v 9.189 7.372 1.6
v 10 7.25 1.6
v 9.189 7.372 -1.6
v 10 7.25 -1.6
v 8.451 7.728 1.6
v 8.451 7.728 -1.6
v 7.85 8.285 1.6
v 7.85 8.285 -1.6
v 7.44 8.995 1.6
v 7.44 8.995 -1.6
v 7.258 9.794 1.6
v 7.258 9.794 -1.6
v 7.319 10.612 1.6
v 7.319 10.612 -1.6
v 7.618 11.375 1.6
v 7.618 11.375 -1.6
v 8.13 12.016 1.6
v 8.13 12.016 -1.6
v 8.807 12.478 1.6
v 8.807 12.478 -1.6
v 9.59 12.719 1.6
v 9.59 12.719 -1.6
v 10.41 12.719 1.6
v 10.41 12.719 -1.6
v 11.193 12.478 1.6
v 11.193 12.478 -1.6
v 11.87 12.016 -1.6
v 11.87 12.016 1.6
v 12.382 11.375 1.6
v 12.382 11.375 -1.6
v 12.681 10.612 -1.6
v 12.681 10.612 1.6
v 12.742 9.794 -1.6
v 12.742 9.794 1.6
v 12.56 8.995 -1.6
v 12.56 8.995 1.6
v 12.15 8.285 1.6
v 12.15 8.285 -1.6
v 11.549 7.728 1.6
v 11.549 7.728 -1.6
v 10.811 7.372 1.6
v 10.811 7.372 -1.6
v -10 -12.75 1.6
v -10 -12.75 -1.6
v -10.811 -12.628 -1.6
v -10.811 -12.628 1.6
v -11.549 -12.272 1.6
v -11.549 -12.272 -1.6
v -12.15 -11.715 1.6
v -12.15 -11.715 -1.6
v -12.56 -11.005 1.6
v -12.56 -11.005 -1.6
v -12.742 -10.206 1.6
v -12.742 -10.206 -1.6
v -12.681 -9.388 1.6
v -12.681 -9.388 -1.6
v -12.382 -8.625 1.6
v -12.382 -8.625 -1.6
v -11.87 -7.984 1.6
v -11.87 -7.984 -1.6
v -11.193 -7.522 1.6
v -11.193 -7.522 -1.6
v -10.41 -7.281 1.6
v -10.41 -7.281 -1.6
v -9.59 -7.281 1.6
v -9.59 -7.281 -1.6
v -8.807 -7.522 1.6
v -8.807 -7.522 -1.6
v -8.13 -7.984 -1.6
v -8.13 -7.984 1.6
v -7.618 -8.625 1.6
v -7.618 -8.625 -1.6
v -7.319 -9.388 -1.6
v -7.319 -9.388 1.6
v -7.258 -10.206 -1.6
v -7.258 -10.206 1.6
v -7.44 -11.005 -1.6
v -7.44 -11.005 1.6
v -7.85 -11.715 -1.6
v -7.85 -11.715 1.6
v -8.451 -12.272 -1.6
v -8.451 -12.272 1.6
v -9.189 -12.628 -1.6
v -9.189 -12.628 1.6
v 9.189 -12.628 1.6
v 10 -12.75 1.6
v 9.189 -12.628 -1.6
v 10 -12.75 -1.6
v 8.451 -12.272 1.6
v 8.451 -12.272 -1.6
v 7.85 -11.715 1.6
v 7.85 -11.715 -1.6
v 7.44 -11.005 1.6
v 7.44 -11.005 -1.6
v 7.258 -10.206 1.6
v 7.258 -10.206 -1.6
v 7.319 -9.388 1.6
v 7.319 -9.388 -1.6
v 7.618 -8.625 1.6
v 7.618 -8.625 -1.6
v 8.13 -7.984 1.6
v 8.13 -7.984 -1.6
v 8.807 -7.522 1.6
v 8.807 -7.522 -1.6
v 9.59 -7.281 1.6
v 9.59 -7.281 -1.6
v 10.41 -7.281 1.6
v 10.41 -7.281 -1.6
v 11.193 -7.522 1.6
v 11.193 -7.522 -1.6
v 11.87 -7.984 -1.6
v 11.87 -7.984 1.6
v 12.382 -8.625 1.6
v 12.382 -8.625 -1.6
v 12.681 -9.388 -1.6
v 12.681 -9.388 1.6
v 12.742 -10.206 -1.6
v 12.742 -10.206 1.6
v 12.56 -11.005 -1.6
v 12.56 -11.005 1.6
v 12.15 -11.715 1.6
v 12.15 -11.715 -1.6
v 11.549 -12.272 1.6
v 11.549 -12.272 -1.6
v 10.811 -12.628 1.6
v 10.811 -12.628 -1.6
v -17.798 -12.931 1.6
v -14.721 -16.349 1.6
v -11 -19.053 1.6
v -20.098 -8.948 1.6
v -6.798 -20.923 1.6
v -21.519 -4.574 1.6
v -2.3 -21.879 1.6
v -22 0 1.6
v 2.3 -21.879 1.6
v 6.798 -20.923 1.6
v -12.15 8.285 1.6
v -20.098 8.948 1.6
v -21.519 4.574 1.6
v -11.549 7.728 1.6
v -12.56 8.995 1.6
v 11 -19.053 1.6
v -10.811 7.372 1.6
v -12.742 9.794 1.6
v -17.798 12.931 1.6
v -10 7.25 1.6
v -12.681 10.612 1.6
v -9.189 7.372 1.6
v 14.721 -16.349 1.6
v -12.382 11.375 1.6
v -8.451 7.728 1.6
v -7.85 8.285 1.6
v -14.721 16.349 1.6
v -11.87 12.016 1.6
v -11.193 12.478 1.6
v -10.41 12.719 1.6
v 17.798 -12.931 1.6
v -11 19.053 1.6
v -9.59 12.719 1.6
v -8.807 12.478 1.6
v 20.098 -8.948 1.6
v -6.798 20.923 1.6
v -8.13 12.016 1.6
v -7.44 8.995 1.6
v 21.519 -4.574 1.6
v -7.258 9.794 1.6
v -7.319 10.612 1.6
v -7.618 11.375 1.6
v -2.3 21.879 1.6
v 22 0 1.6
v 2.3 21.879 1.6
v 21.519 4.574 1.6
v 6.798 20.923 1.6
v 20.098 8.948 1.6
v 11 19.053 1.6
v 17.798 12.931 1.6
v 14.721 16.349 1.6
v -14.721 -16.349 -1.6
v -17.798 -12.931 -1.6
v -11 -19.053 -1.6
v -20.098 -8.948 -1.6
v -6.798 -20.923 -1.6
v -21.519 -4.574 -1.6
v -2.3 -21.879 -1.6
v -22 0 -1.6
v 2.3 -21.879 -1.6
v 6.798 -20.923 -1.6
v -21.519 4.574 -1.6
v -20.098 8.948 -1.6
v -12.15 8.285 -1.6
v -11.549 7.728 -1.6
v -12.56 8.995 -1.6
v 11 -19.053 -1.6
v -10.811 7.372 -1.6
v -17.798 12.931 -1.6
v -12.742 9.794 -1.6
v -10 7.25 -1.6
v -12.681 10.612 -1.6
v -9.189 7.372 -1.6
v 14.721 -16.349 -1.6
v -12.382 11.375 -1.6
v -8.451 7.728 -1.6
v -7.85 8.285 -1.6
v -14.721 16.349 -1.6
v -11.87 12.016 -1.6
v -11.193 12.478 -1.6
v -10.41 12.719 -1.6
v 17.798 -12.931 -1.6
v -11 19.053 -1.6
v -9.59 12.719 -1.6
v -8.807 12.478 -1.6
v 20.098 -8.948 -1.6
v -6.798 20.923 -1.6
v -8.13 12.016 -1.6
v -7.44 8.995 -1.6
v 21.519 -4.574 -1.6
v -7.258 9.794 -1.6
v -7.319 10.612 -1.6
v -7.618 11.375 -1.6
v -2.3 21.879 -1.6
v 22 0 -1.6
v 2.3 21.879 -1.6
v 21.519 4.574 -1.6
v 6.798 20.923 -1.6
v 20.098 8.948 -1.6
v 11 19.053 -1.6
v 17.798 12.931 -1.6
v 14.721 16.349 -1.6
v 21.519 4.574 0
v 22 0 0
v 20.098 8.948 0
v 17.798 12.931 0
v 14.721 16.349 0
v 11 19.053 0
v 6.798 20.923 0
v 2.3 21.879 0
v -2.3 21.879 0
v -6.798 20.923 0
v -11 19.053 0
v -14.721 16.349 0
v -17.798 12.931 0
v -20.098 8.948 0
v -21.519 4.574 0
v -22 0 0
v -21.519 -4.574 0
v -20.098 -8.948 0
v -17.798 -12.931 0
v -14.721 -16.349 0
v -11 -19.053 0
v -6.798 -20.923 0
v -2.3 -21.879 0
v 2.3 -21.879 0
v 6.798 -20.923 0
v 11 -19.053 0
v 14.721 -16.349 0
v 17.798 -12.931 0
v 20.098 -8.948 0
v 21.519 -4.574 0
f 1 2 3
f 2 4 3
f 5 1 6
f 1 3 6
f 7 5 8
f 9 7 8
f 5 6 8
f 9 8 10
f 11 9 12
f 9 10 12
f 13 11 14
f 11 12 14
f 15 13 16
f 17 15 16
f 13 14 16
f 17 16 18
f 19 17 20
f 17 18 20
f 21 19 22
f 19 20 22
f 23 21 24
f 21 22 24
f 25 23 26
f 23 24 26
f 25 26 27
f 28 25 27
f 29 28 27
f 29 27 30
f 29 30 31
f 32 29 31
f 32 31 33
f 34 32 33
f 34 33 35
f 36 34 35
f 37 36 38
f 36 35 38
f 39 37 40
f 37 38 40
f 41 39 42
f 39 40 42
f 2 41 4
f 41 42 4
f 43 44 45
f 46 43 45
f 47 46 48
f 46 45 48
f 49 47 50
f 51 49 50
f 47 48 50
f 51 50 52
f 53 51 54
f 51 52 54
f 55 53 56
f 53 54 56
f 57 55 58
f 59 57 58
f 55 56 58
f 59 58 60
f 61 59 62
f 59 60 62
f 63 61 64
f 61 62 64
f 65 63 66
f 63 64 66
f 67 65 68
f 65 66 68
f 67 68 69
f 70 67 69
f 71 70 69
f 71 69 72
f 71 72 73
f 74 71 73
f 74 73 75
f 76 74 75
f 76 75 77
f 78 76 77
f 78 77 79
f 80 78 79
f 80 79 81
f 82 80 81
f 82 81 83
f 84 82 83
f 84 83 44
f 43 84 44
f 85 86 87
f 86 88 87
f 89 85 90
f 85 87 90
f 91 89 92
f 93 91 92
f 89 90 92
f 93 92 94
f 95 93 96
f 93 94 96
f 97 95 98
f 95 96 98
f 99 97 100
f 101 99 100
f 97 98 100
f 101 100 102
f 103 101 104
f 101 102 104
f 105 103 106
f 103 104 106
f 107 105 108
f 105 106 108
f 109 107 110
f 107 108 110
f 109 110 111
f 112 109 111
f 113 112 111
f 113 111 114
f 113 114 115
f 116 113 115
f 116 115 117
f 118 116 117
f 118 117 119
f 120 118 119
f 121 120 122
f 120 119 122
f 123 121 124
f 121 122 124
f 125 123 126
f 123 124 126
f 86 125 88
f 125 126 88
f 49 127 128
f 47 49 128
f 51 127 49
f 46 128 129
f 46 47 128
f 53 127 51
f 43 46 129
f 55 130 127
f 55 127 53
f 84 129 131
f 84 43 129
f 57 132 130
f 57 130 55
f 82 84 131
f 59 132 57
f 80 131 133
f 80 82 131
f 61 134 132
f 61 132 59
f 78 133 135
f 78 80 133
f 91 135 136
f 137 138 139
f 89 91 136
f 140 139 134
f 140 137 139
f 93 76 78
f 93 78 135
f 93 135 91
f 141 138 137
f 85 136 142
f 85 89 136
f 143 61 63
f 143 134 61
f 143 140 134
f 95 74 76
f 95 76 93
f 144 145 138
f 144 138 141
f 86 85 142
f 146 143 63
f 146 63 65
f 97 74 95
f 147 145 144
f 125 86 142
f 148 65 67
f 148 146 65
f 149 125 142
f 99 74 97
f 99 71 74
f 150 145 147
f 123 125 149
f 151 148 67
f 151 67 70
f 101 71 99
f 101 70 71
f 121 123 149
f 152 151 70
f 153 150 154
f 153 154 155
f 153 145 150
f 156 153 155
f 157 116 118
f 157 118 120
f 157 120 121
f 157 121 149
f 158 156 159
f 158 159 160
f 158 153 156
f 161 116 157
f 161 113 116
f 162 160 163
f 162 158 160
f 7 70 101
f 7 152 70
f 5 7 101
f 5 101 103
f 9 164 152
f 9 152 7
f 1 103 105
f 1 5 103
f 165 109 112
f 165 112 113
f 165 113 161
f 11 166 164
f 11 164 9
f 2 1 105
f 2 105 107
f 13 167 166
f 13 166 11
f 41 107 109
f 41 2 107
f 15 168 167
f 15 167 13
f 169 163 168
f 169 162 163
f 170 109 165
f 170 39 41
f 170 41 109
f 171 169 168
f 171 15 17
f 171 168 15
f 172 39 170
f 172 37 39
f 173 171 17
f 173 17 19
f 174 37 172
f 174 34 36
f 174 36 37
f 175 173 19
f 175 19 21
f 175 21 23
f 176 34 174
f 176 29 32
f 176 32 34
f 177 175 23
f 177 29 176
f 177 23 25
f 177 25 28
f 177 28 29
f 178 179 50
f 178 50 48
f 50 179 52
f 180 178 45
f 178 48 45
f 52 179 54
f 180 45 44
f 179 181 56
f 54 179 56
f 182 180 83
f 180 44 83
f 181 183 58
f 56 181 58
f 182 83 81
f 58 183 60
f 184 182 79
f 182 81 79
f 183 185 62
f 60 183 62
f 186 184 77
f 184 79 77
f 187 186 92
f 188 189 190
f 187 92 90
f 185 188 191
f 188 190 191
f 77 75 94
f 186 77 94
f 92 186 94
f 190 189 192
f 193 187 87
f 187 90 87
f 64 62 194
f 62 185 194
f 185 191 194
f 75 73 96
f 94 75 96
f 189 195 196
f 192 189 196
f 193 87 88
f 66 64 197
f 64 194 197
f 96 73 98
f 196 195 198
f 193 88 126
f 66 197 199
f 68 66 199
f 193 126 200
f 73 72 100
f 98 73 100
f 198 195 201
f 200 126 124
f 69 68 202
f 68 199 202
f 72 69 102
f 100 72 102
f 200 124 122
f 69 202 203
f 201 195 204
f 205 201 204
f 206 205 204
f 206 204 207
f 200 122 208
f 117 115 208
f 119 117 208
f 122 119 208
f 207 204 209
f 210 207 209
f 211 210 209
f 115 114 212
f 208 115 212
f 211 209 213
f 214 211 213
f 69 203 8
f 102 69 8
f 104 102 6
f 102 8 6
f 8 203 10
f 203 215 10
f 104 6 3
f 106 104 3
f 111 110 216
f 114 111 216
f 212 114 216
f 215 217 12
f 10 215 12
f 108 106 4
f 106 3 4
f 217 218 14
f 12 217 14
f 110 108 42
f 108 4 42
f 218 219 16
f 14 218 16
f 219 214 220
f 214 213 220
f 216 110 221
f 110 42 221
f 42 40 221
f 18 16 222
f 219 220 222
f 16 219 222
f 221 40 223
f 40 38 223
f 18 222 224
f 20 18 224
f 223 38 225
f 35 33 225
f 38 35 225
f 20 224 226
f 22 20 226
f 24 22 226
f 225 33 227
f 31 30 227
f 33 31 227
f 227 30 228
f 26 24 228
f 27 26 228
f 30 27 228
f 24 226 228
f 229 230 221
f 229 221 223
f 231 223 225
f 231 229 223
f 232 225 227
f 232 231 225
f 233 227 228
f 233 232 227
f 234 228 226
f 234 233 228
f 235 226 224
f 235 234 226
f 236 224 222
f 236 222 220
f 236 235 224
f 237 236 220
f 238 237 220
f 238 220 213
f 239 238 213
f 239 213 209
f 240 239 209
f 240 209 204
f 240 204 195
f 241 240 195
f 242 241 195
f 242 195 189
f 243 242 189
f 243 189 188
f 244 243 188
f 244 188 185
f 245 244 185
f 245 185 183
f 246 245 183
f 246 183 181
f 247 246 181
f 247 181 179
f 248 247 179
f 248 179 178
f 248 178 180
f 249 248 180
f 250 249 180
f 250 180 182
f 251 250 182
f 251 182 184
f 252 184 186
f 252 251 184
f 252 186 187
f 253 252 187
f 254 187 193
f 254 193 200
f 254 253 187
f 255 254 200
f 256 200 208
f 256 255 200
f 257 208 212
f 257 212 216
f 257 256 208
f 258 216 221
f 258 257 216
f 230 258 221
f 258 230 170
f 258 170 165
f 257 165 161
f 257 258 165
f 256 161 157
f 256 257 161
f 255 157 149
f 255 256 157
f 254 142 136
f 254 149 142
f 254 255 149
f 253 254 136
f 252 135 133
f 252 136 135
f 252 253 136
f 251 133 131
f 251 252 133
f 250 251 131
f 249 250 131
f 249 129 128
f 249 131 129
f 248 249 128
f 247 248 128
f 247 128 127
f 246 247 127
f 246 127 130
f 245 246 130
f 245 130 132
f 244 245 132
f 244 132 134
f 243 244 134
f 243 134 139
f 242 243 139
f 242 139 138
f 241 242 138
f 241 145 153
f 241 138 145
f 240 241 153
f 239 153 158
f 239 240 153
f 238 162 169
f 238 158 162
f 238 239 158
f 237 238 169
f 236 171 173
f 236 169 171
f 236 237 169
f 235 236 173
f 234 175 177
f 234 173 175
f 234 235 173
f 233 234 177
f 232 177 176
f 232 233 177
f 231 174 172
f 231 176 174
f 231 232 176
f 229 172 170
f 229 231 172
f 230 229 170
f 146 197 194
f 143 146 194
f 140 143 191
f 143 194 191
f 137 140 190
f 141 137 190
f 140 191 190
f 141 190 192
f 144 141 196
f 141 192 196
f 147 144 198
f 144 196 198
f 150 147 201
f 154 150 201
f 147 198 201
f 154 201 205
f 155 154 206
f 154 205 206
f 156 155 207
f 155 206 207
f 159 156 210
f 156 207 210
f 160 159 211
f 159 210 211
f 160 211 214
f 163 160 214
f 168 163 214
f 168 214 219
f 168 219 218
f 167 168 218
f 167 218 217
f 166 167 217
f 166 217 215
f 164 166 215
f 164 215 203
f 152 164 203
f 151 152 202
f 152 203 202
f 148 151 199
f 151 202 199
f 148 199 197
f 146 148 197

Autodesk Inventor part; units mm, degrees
ref_plane "YZ Plane" through (0, 0, 0) normal (1, 0, 0) x (0, 1, 0)
ref_plane "XZ Plane" through (0, 0, 0) normal (0, 1, 0) x (-1, 0, 0)
ref_plane "XY Plane" through (0, 0, 0) normal (0, 0, 1) x (1, 0, 0)
sketch "スケッチ1" plane through (0, 0, 0) normal (0, 0, 1) x (1, 0, 0)
  circle A0 centre (0, 0) radius 22
  dimension "d0" = 44
extrude "プレート1" add sketch "スケッチ1" along normal mid plane 3.2
sketch "スケッチ2" plane through (0, 0, 1.6) normal (0, 0, 1) x (1, 0, 0)
  line L0 (-10, -10) -> (10, -10)
  line L1 (10, -10) -> (10, 10)
  line L2 (10, 10) -> (-10, 10)
  line L3 (-10, 10) -> (-10, -10)
  line L4 (-10, -10) -> (10, 10) construction
  line L5 (10, -10) -> (-10, 10) construction
  point P0 (0, 0)
  dimension "d2" = 20
  dimension "d3" = 20
hole "穴1" at (-10, 10, 1.6) at (10, 10, 1.6) at (10, -10, 1.6) at (-10, -10, 1.6) direction (0, 0, -1) diameter 5.5 depth 3.2 tip angle 118 clearance for "Flat Head Machine Screw" size "M5" standard "Ansi Metric M Profile"
equation "\"d9\" = Thickness"
equation "\"d1\" = Thickness"
equation "\"BendRadius\" = Thickness"
equation "\"BendReliefWidth\" = Thickness"
equation "\"BendReliefDepth\" = 0.5 * Thickness"
equation "\"CornerReliefSize\" = 4 * Thickness"
equation "\"MinimumRemnant\" = 2 * Thickness"
equation "\"TransitionRadius\" = BendRadius"
equation "\"JacobiRadiusSize\" = BendRadius"
equation "\"GapSize\" = Thickness"
equation "\"Thickness\" = 3.2"
properties part number "scara-plate2" material "鋼、炭素鋼"
